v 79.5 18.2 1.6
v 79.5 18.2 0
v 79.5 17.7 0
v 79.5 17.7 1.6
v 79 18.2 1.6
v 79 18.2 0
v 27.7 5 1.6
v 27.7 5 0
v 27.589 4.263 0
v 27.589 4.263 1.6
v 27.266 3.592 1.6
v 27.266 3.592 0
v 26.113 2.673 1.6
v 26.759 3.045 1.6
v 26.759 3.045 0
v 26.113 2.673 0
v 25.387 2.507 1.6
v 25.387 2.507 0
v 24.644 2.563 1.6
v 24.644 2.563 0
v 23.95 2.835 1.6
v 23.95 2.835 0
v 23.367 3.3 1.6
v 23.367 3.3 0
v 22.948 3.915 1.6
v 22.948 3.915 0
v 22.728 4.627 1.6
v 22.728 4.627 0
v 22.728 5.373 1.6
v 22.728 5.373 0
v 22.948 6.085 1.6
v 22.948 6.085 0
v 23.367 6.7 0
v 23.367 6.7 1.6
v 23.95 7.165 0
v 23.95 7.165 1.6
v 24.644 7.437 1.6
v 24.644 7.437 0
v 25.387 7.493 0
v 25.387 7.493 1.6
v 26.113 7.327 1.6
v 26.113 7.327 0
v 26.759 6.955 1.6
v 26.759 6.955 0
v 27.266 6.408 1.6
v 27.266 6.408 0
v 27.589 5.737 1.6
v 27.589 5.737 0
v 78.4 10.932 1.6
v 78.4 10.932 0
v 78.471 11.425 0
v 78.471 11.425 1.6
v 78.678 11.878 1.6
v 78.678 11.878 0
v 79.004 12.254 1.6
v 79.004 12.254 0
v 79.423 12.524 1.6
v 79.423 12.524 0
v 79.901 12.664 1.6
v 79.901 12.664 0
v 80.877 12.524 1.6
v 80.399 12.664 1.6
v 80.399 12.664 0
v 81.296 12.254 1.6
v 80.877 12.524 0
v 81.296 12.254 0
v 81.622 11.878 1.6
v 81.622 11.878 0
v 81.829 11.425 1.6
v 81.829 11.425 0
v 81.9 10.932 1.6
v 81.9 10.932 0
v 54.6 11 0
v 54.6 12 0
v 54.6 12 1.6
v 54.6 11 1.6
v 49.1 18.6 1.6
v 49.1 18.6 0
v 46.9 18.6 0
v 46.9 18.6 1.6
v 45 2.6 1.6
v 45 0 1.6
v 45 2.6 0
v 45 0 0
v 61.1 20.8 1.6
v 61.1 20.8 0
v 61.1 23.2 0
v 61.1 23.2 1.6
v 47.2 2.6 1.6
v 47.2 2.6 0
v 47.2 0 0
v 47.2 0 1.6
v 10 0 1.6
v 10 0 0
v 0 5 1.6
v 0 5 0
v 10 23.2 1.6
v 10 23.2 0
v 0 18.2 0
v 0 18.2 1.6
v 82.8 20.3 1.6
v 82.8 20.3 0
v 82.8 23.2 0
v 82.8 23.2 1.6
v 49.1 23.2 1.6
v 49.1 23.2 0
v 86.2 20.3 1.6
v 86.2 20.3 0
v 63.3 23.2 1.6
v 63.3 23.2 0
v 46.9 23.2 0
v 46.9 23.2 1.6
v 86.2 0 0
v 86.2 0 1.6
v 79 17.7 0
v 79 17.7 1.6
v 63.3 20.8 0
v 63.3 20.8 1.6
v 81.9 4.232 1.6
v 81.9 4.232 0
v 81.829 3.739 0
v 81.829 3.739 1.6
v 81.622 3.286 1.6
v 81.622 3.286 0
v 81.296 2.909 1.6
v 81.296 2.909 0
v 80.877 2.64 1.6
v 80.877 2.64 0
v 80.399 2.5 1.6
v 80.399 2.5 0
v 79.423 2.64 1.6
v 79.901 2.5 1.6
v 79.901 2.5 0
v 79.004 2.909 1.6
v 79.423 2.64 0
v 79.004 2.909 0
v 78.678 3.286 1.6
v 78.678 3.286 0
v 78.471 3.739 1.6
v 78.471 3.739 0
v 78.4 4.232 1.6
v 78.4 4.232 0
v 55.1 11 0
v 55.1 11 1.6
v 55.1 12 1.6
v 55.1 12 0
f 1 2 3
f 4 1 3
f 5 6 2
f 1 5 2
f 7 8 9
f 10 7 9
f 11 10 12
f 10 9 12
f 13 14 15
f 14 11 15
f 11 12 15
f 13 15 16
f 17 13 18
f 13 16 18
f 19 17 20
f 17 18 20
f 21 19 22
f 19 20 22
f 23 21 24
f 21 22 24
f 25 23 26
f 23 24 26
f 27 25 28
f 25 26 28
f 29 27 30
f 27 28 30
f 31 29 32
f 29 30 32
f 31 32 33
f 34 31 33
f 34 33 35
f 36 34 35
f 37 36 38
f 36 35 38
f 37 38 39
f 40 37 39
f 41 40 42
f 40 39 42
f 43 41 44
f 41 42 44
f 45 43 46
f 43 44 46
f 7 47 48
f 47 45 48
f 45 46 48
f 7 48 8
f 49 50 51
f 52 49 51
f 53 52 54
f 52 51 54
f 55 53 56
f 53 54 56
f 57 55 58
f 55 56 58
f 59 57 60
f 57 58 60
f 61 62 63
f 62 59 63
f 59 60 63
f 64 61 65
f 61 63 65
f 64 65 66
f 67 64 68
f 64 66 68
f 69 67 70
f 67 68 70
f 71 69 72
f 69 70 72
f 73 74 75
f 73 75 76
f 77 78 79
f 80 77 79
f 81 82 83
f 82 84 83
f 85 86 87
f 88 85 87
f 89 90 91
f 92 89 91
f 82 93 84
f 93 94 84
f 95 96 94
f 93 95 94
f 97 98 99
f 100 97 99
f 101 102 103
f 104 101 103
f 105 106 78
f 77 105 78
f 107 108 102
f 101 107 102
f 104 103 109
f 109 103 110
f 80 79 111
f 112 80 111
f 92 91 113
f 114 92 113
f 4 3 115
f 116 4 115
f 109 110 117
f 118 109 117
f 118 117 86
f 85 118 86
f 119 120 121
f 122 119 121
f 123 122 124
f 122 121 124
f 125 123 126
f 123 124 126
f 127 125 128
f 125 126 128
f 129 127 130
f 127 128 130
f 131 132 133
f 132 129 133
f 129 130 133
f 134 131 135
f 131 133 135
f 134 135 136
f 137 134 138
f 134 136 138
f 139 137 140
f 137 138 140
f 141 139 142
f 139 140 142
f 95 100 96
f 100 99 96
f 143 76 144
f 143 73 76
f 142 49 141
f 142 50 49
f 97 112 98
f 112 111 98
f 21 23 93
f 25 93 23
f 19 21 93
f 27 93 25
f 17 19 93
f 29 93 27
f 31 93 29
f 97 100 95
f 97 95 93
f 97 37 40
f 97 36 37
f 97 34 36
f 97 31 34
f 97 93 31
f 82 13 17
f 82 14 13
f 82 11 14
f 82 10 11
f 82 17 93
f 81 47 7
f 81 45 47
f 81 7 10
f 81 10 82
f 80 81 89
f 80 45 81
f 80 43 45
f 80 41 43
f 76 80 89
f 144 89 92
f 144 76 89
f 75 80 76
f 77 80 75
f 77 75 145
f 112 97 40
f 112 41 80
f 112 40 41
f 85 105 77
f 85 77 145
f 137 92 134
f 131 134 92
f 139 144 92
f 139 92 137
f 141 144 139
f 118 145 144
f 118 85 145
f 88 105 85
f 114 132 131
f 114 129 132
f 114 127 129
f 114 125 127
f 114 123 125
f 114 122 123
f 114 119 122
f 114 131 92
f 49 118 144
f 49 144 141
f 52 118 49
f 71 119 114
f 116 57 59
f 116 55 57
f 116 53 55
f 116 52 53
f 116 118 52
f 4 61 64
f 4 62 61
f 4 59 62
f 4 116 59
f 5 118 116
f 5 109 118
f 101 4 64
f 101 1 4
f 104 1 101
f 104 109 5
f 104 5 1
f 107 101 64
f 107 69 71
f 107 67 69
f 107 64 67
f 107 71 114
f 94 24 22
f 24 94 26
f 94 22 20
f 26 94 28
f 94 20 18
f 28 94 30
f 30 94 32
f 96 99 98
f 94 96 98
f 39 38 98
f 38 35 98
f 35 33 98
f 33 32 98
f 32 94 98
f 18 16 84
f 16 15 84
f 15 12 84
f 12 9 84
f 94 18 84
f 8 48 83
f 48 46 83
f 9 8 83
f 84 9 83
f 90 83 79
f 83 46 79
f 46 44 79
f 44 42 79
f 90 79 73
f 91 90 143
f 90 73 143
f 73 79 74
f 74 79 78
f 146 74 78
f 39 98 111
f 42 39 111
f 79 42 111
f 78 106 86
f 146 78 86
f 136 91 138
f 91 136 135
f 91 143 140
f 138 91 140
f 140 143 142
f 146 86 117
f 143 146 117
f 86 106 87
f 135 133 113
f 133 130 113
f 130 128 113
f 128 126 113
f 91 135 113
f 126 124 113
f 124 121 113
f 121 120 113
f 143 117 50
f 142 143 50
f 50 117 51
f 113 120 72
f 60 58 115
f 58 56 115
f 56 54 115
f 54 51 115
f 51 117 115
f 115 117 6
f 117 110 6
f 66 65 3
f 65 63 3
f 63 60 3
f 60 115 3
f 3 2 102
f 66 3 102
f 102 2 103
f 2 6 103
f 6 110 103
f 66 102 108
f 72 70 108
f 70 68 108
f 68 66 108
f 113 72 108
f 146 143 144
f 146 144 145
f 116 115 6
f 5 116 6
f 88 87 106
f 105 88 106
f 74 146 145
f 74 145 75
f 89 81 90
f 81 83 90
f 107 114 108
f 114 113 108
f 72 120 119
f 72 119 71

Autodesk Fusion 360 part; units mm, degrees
sketch "Sketch1" plane through (0, 0, 0) normal (0, 0, 1) x (1, 0, 0) in component "Component"
  line L0 (0, 23.2) -> (86.2, 23.2) construction
  line L1 (86.2, 23.2) -> (86.2, 0) construction
  line L2 (86.2, 0) -> (0, 0) construction
  line L3 (0, 0) -> (0, 23.2) construction
  line L4 (86.2, 20.3) -> (82.8, 20.3)
  line L5 (82.8, 20.3) -> (82.8, 23.2)
  line L6 (82.8, 23.2) -> (63.2045, 23.2)
  line L7 (63.3, 23.2) -> (63.3, 20.8)
  line L8 (63.3, 20.8) -> (61.1, 20.8)
  line L9 (61.1, 20.8) -> (61.1, 23.2)
  line L10 (61.1, 23.2) -> (49.1, 23.2)
  line L11 (49.1, 23.2) -> (49.1, 18.6)
  line L12 (49.1, 18.6) -> (46.9, 18.6)
  line L13 (46.9, 18.6) -> (46.9, 23.2)
  line L14 (46.9, 23.2) -> (10, 23.2)
  line L15 (10, 23.2) -> (0, 18.2)
  line L16 (0, 18.2) -> (0, 5)
  line L17 (0, 5) -> (10, 0)
  line L18 (10, 0) -> (45, 0)
  line L19 (45, 0) -> (45, 2.6)
  line L20 (45, 2.6) -> (47.2, 2.6)
  line L21 (47.2, 2.6) -> (47.2, 0)
  line L22 (47.2, 0) -> (86.2, 0)
  line L23 (86.2, 0) -> (86.2, 20.3)
  circle A0 centre (25.2, 5) radius 2.5
  line L24 (78.4, 10.9318) -> (78.4, 4.2318)
  arc A1 (78.4, 4.2318) -> (81.9, 4.2318) centre (80.15, 4.2318) ccw
  line L25 (81.9, 4.2318) -> (81.9, 10.9318)
  arc A2 (81.9, 10.9318) -> (78.4, 10.9318) centre (80.15, 10.9318) ccw
  line L26 (55.1, 12) -> (54.6, 12)
  line L27 (54.6, 12) -> (54.6, 11)
  line L28 (54.6, 11) -> (55.1, 11)
  line L29 (55.1, 11) -> (55.1, 12)
  line L30 (79, 18.2) -> (79.5, 18.2)
  line L31 (79.5, 18.2) -> (79.5, 17.7)
  line L32 (79.5, 17.7) -> (79, 17.7)
  line L33 (79, 17.7) -> (79, 18.2)
  dimension "d1" = 86.2
  dimension "d2" = 23.2
  dimension "d3" = 2.2
  dimension "d4" = 2.2
  dimension "d5" = 4.6
  dimension "d6" = 2.4
  dimension "d7" = 2.2
  dimension "d8" = 2.6
  dimension "d9" = 3.4
  dimension "d10" = 2.9
  dimension "d11" = 10
  dimension "d12" = 5
  dimension "d13" = 25.2
  dimension "d14" = 5
  dimension "d15" = 5
  dimension "d16" = 45
  dimension "d17" = 46.9
  dimension "d18" = 61.1
  dimension "d19" = 6.7
  dimension "d20" = 4.3
  dimension "d21" = 4.2318
  dimension "d22" = 1.75
  dimension "d23" = 0.5
  dimension "d24" = 55.1
  dimension "d25" = 1
  dimension "d26" = 12
  dimension "d27" = 0.5
  dimension "d28" = 0.5
  dimension "d29" = 79.5
  dimension "d30" = 5
extrude "Extrude1" add sketch "Sketch1" along normal blind 1.6 in component "Component"
component "Component" placed x (1, 0, 0) y (0, 1, 0) z (0, 0, 1) at (0, 0, 0)
